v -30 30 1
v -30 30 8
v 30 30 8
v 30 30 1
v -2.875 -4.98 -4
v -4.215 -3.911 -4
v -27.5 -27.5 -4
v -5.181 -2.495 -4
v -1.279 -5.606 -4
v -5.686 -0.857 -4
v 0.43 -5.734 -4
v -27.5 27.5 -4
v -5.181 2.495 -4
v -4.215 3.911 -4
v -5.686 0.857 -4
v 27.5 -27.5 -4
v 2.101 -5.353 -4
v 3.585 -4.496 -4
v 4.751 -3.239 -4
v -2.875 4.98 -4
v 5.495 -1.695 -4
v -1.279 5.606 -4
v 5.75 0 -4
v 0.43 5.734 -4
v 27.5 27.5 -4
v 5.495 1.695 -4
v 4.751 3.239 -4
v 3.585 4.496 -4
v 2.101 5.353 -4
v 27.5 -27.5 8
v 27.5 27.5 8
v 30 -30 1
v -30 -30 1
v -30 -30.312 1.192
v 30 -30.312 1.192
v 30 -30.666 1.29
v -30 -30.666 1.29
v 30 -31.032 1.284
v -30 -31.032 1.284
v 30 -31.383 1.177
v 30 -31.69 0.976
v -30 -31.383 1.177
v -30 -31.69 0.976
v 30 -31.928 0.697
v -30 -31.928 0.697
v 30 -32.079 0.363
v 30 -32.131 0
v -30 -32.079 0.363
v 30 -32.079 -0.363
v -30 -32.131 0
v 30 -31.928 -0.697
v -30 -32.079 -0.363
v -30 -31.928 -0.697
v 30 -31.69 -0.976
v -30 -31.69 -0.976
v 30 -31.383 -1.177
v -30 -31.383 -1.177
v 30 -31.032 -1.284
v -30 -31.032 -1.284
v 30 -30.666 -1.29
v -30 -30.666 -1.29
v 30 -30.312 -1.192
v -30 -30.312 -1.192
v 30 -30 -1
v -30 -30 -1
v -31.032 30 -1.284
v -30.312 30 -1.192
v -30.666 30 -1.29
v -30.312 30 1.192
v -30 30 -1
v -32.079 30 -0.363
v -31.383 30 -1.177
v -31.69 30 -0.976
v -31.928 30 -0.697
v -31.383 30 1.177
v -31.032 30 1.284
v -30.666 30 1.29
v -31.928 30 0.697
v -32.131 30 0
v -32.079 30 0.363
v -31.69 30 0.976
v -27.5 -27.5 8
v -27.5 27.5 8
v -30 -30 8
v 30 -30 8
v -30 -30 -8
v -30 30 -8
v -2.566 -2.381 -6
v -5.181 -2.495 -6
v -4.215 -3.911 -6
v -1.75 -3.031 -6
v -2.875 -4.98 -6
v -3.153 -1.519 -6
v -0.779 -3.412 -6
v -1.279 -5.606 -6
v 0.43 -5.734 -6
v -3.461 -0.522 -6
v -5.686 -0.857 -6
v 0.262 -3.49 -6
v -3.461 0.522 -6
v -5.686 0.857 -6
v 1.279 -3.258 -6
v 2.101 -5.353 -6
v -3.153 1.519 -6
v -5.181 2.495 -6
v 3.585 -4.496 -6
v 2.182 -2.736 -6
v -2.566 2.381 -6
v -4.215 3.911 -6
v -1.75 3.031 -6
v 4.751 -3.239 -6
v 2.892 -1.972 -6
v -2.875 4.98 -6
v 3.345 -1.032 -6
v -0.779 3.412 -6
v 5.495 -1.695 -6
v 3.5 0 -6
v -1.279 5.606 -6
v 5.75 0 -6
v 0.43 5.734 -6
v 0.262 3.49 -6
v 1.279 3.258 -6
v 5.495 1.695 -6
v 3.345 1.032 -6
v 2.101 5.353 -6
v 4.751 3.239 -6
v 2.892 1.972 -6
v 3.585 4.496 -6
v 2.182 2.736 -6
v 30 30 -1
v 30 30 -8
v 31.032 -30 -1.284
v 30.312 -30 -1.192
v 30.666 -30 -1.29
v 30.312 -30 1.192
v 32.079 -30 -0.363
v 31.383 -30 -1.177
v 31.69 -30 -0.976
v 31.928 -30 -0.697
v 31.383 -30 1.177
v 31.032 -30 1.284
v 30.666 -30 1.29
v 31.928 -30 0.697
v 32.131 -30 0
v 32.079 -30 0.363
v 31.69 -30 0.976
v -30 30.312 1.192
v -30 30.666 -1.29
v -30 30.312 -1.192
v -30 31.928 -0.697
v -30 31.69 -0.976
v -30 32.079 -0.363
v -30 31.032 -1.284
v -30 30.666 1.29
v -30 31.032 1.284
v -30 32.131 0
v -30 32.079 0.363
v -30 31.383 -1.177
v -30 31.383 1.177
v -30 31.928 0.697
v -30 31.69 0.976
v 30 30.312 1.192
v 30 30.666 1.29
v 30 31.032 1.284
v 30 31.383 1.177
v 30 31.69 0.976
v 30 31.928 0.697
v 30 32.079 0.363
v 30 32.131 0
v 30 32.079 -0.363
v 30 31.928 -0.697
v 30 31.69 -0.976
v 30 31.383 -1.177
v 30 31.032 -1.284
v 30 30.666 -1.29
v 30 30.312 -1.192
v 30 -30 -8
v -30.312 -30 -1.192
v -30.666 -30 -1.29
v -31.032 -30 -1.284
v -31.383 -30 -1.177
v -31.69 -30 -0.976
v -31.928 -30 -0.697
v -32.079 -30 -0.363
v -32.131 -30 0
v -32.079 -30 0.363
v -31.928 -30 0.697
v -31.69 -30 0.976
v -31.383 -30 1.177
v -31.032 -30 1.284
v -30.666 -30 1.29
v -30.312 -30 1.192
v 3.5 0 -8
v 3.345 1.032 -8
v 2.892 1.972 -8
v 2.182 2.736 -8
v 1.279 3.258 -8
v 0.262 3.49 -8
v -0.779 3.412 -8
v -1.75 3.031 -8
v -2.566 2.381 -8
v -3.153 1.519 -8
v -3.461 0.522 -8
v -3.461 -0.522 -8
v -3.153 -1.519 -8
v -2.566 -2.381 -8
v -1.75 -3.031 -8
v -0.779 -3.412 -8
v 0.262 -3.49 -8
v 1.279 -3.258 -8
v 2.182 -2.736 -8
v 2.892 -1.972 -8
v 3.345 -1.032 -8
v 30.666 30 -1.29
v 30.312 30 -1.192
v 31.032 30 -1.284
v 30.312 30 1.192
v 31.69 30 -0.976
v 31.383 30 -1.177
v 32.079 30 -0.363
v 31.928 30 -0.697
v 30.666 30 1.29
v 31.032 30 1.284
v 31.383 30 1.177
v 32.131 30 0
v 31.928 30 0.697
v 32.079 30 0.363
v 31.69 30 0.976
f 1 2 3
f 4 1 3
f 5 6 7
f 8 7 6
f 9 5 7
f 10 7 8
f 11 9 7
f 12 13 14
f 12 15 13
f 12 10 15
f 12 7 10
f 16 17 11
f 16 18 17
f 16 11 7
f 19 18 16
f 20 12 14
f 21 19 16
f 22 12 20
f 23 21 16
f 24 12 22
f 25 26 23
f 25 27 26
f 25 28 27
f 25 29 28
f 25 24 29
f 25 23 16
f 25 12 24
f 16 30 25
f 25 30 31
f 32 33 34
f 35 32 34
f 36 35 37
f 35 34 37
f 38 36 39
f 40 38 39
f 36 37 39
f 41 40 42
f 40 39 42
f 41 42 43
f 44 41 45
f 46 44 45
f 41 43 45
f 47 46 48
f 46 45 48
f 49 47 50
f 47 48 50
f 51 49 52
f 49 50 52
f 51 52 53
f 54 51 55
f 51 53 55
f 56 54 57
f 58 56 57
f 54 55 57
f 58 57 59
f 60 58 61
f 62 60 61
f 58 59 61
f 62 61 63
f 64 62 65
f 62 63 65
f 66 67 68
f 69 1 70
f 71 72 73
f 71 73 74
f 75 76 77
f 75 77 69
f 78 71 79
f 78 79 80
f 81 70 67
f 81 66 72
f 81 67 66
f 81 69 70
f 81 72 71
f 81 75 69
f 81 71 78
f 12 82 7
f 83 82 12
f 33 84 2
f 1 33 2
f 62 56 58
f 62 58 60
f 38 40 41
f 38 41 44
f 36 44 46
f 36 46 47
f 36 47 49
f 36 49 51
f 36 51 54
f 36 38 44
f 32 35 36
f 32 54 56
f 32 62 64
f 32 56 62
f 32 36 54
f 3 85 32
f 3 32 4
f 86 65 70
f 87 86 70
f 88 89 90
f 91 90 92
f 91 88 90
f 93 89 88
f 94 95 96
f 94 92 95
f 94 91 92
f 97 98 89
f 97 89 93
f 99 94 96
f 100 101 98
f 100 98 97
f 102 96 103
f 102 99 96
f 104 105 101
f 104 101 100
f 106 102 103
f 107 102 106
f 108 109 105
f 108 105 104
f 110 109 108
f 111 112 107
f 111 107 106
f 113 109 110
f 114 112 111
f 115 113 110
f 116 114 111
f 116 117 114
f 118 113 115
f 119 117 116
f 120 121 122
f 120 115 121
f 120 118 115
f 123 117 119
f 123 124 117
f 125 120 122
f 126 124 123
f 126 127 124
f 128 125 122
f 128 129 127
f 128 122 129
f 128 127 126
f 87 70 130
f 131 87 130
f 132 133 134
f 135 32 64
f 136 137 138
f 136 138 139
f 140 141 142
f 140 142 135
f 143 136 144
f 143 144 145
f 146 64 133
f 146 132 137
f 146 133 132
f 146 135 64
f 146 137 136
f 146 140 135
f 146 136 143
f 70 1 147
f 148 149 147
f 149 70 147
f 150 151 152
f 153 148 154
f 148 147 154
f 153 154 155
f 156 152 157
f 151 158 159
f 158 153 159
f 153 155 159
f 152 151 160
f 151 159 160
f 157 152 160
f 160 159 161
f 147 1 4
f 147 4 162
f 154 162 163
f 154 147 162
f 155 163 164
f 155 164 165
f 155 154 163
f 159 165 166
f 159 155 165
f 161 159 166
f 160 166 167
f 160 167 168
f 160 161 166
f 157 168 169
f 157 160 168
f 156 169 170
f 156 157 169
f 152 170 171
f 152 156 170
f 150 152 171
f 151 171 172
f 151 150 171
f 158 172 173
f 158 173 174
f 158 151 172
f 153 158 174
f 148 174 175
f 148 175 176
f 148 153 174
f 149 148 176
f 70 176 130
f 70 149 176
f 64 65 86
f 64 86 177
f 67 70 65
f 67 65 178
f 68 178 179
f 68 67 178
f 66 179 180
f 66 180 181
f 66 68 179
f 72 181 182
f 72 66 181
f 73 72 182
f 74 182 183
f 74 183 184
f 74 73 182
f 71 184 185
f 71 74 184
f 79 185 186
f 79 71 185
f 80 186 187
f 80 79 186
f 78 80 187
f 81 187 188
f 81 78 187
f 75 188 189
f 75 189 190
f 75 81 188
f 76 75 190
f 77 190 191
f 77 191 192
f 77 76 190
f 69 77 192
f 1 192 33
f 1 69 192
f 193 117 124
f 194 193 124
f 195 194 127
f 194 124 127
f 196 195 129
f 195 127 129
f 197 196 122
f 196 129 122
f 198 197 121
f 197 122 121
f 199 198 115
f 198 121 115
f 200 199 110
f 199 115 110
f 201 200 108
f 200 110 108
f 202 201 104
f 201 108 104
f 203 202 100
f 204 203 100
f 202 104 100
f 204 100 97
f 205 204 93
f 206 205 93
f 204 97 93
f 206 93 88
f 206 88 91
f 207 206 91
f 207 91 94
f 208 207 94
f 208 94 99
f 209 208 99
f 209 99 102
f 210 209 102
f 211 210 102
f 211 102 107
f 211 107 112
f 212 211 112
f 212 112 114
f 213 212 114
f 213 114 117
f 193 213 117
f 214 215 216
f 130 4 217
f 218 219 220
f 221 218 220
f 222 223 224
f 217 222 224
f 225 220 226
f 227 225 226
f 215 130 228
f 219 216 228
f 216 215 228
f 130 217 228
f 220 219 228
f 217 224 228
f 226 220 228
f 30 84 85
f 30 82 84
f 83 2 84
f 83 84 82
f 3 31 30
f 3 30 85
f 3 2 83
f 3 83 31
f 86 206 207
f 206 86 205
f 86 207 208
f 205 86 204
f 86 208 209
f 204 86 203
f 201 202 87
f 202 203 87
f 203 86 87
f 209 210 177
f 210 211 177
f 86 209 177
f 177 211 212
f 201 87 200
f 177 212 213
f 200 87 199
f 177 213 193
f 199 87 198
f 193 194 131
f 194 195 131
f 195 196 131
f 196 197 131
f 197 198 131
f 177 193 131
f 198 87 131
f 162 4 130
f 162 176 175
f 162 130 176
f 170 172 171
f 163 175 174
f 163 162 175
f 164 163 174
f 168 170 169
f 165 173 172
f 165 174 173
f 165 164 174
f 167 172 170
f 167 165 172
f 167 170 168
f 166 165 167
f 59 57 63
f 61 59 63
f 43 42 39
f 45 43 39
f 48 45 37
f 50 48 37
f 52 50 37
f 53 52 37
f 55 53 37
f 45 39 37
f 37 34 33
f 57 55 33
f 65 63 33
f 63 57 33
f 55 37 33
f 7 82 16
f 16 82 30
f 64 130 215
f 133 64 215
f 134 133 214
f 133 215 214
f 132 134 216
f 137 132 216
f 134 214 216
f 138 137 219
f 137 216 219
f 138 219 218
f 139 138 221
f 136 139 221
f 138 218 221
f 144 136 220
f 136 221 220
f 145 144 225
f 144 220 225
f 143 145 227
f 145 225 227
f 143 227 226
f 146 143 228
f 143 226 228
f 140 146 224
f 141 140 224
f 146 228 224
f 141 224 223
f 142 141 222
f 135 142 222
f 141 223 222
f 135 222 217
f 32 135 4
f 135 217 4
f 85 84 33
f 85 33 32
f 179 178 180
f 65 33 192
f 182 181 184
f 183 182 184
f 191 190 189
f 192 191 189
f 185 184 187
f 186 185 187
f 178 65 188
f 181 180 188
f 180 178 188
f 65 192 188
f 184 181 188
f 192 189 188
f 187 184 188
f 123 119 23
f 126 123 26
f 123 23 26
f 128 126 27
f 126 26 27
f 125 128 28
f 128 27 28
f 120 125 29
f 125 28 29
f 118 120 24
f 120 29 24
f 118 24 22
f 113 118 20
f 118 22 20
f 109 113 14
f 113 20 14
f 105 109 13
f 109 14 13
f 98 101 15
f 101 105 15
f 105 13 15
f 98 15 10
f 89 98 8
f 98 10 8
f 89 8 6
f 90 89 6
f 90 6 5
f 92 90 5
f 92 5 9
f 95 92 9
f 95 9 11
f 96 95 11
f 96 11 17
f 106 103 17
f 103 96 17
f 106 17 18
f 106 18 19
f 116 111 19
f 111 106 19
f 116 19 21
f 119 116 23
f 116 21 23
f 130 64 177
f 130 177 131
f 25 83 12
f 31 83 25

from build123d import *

# Parameters (mm, degrees)
F0_W          = 60
F0_H          = 60
F0_R          = 3.5
F1_DEPTH      = 8
F1_DEPTH_BACK = 8
F2_R          = 5.75
F3_DEPTH      = 14
F5_DEPTH      = 60
F8_DEPTH      = 60
F10_W         = 55
F10_H         = 55
F11_DEPTH     = 12


with BuildPart() as f1:
    # F0 (on Top) → F1 (new body, two sides)
    with BuildSketch(Plane.XY) as f1_sk:
        Rectangle(F0_W, F0_H)
        Circle(F0_R, mode=Mode.SUBTRACT)
    extrude(amount=F1_DEPTH)
    extrude(f1_sk.sketch, amount=-F1_DEPTH_BACK)

    # F2 (on face) → F3 (cut)
    with BuildSketch(Plane.XY.offset(8)):
        Circle(F2_R)
    extrude(amount=-F3_DEPTH, mode=Mode.SUBTRACT)

    # F4 (on face) → F5 (join)
    with BuildSketch(Plane(origin=(-30, 0, 0), x_dir=(0, -1, 0), z_dir=(-1, 0, 0))):
        with BuildLine():
            ThreePointArc((-30, 1), (-32.1306623863, 0), (-30, -1))
            Line((-30, -1), (-30, 1))
        make_face()
    extrude(amount=-F5_DEPTH)

    # F6: F1 across plane


with BuildPart() as f1_1:
    add(f1.part)
    add(f1.part.mirror(Plane.XZ))

    # F7 (on face) → F8 (join)
    with BuildSketch(Plane(origin=(0, 30, 0), x_dir=(-1, 0, 0), z_dir=(0, 1, 0))):
        with BuildLine():
            ThreePointArc((30, -1), (32.1306623863, 0), (30, 1))
            Line((30, 1), (30, -1))
        make_face()
    extrude(amount=-F8_DEPTH)

    # F9: F1 across plane


with BuildPart() as f1_2:
    add(f1_1.part)
    add(f1_1.part.mirror(Plane.YZ))

    # F10 (on face) → F11 (cut)
    with BuildSketch(Plane.XY.offset(8)):
        Rectangle(F10_W, F10_H)
    extrude(amount=-F11_DEPTH, mode=Mode.SUBTRACT)


solid = f1_2.part
